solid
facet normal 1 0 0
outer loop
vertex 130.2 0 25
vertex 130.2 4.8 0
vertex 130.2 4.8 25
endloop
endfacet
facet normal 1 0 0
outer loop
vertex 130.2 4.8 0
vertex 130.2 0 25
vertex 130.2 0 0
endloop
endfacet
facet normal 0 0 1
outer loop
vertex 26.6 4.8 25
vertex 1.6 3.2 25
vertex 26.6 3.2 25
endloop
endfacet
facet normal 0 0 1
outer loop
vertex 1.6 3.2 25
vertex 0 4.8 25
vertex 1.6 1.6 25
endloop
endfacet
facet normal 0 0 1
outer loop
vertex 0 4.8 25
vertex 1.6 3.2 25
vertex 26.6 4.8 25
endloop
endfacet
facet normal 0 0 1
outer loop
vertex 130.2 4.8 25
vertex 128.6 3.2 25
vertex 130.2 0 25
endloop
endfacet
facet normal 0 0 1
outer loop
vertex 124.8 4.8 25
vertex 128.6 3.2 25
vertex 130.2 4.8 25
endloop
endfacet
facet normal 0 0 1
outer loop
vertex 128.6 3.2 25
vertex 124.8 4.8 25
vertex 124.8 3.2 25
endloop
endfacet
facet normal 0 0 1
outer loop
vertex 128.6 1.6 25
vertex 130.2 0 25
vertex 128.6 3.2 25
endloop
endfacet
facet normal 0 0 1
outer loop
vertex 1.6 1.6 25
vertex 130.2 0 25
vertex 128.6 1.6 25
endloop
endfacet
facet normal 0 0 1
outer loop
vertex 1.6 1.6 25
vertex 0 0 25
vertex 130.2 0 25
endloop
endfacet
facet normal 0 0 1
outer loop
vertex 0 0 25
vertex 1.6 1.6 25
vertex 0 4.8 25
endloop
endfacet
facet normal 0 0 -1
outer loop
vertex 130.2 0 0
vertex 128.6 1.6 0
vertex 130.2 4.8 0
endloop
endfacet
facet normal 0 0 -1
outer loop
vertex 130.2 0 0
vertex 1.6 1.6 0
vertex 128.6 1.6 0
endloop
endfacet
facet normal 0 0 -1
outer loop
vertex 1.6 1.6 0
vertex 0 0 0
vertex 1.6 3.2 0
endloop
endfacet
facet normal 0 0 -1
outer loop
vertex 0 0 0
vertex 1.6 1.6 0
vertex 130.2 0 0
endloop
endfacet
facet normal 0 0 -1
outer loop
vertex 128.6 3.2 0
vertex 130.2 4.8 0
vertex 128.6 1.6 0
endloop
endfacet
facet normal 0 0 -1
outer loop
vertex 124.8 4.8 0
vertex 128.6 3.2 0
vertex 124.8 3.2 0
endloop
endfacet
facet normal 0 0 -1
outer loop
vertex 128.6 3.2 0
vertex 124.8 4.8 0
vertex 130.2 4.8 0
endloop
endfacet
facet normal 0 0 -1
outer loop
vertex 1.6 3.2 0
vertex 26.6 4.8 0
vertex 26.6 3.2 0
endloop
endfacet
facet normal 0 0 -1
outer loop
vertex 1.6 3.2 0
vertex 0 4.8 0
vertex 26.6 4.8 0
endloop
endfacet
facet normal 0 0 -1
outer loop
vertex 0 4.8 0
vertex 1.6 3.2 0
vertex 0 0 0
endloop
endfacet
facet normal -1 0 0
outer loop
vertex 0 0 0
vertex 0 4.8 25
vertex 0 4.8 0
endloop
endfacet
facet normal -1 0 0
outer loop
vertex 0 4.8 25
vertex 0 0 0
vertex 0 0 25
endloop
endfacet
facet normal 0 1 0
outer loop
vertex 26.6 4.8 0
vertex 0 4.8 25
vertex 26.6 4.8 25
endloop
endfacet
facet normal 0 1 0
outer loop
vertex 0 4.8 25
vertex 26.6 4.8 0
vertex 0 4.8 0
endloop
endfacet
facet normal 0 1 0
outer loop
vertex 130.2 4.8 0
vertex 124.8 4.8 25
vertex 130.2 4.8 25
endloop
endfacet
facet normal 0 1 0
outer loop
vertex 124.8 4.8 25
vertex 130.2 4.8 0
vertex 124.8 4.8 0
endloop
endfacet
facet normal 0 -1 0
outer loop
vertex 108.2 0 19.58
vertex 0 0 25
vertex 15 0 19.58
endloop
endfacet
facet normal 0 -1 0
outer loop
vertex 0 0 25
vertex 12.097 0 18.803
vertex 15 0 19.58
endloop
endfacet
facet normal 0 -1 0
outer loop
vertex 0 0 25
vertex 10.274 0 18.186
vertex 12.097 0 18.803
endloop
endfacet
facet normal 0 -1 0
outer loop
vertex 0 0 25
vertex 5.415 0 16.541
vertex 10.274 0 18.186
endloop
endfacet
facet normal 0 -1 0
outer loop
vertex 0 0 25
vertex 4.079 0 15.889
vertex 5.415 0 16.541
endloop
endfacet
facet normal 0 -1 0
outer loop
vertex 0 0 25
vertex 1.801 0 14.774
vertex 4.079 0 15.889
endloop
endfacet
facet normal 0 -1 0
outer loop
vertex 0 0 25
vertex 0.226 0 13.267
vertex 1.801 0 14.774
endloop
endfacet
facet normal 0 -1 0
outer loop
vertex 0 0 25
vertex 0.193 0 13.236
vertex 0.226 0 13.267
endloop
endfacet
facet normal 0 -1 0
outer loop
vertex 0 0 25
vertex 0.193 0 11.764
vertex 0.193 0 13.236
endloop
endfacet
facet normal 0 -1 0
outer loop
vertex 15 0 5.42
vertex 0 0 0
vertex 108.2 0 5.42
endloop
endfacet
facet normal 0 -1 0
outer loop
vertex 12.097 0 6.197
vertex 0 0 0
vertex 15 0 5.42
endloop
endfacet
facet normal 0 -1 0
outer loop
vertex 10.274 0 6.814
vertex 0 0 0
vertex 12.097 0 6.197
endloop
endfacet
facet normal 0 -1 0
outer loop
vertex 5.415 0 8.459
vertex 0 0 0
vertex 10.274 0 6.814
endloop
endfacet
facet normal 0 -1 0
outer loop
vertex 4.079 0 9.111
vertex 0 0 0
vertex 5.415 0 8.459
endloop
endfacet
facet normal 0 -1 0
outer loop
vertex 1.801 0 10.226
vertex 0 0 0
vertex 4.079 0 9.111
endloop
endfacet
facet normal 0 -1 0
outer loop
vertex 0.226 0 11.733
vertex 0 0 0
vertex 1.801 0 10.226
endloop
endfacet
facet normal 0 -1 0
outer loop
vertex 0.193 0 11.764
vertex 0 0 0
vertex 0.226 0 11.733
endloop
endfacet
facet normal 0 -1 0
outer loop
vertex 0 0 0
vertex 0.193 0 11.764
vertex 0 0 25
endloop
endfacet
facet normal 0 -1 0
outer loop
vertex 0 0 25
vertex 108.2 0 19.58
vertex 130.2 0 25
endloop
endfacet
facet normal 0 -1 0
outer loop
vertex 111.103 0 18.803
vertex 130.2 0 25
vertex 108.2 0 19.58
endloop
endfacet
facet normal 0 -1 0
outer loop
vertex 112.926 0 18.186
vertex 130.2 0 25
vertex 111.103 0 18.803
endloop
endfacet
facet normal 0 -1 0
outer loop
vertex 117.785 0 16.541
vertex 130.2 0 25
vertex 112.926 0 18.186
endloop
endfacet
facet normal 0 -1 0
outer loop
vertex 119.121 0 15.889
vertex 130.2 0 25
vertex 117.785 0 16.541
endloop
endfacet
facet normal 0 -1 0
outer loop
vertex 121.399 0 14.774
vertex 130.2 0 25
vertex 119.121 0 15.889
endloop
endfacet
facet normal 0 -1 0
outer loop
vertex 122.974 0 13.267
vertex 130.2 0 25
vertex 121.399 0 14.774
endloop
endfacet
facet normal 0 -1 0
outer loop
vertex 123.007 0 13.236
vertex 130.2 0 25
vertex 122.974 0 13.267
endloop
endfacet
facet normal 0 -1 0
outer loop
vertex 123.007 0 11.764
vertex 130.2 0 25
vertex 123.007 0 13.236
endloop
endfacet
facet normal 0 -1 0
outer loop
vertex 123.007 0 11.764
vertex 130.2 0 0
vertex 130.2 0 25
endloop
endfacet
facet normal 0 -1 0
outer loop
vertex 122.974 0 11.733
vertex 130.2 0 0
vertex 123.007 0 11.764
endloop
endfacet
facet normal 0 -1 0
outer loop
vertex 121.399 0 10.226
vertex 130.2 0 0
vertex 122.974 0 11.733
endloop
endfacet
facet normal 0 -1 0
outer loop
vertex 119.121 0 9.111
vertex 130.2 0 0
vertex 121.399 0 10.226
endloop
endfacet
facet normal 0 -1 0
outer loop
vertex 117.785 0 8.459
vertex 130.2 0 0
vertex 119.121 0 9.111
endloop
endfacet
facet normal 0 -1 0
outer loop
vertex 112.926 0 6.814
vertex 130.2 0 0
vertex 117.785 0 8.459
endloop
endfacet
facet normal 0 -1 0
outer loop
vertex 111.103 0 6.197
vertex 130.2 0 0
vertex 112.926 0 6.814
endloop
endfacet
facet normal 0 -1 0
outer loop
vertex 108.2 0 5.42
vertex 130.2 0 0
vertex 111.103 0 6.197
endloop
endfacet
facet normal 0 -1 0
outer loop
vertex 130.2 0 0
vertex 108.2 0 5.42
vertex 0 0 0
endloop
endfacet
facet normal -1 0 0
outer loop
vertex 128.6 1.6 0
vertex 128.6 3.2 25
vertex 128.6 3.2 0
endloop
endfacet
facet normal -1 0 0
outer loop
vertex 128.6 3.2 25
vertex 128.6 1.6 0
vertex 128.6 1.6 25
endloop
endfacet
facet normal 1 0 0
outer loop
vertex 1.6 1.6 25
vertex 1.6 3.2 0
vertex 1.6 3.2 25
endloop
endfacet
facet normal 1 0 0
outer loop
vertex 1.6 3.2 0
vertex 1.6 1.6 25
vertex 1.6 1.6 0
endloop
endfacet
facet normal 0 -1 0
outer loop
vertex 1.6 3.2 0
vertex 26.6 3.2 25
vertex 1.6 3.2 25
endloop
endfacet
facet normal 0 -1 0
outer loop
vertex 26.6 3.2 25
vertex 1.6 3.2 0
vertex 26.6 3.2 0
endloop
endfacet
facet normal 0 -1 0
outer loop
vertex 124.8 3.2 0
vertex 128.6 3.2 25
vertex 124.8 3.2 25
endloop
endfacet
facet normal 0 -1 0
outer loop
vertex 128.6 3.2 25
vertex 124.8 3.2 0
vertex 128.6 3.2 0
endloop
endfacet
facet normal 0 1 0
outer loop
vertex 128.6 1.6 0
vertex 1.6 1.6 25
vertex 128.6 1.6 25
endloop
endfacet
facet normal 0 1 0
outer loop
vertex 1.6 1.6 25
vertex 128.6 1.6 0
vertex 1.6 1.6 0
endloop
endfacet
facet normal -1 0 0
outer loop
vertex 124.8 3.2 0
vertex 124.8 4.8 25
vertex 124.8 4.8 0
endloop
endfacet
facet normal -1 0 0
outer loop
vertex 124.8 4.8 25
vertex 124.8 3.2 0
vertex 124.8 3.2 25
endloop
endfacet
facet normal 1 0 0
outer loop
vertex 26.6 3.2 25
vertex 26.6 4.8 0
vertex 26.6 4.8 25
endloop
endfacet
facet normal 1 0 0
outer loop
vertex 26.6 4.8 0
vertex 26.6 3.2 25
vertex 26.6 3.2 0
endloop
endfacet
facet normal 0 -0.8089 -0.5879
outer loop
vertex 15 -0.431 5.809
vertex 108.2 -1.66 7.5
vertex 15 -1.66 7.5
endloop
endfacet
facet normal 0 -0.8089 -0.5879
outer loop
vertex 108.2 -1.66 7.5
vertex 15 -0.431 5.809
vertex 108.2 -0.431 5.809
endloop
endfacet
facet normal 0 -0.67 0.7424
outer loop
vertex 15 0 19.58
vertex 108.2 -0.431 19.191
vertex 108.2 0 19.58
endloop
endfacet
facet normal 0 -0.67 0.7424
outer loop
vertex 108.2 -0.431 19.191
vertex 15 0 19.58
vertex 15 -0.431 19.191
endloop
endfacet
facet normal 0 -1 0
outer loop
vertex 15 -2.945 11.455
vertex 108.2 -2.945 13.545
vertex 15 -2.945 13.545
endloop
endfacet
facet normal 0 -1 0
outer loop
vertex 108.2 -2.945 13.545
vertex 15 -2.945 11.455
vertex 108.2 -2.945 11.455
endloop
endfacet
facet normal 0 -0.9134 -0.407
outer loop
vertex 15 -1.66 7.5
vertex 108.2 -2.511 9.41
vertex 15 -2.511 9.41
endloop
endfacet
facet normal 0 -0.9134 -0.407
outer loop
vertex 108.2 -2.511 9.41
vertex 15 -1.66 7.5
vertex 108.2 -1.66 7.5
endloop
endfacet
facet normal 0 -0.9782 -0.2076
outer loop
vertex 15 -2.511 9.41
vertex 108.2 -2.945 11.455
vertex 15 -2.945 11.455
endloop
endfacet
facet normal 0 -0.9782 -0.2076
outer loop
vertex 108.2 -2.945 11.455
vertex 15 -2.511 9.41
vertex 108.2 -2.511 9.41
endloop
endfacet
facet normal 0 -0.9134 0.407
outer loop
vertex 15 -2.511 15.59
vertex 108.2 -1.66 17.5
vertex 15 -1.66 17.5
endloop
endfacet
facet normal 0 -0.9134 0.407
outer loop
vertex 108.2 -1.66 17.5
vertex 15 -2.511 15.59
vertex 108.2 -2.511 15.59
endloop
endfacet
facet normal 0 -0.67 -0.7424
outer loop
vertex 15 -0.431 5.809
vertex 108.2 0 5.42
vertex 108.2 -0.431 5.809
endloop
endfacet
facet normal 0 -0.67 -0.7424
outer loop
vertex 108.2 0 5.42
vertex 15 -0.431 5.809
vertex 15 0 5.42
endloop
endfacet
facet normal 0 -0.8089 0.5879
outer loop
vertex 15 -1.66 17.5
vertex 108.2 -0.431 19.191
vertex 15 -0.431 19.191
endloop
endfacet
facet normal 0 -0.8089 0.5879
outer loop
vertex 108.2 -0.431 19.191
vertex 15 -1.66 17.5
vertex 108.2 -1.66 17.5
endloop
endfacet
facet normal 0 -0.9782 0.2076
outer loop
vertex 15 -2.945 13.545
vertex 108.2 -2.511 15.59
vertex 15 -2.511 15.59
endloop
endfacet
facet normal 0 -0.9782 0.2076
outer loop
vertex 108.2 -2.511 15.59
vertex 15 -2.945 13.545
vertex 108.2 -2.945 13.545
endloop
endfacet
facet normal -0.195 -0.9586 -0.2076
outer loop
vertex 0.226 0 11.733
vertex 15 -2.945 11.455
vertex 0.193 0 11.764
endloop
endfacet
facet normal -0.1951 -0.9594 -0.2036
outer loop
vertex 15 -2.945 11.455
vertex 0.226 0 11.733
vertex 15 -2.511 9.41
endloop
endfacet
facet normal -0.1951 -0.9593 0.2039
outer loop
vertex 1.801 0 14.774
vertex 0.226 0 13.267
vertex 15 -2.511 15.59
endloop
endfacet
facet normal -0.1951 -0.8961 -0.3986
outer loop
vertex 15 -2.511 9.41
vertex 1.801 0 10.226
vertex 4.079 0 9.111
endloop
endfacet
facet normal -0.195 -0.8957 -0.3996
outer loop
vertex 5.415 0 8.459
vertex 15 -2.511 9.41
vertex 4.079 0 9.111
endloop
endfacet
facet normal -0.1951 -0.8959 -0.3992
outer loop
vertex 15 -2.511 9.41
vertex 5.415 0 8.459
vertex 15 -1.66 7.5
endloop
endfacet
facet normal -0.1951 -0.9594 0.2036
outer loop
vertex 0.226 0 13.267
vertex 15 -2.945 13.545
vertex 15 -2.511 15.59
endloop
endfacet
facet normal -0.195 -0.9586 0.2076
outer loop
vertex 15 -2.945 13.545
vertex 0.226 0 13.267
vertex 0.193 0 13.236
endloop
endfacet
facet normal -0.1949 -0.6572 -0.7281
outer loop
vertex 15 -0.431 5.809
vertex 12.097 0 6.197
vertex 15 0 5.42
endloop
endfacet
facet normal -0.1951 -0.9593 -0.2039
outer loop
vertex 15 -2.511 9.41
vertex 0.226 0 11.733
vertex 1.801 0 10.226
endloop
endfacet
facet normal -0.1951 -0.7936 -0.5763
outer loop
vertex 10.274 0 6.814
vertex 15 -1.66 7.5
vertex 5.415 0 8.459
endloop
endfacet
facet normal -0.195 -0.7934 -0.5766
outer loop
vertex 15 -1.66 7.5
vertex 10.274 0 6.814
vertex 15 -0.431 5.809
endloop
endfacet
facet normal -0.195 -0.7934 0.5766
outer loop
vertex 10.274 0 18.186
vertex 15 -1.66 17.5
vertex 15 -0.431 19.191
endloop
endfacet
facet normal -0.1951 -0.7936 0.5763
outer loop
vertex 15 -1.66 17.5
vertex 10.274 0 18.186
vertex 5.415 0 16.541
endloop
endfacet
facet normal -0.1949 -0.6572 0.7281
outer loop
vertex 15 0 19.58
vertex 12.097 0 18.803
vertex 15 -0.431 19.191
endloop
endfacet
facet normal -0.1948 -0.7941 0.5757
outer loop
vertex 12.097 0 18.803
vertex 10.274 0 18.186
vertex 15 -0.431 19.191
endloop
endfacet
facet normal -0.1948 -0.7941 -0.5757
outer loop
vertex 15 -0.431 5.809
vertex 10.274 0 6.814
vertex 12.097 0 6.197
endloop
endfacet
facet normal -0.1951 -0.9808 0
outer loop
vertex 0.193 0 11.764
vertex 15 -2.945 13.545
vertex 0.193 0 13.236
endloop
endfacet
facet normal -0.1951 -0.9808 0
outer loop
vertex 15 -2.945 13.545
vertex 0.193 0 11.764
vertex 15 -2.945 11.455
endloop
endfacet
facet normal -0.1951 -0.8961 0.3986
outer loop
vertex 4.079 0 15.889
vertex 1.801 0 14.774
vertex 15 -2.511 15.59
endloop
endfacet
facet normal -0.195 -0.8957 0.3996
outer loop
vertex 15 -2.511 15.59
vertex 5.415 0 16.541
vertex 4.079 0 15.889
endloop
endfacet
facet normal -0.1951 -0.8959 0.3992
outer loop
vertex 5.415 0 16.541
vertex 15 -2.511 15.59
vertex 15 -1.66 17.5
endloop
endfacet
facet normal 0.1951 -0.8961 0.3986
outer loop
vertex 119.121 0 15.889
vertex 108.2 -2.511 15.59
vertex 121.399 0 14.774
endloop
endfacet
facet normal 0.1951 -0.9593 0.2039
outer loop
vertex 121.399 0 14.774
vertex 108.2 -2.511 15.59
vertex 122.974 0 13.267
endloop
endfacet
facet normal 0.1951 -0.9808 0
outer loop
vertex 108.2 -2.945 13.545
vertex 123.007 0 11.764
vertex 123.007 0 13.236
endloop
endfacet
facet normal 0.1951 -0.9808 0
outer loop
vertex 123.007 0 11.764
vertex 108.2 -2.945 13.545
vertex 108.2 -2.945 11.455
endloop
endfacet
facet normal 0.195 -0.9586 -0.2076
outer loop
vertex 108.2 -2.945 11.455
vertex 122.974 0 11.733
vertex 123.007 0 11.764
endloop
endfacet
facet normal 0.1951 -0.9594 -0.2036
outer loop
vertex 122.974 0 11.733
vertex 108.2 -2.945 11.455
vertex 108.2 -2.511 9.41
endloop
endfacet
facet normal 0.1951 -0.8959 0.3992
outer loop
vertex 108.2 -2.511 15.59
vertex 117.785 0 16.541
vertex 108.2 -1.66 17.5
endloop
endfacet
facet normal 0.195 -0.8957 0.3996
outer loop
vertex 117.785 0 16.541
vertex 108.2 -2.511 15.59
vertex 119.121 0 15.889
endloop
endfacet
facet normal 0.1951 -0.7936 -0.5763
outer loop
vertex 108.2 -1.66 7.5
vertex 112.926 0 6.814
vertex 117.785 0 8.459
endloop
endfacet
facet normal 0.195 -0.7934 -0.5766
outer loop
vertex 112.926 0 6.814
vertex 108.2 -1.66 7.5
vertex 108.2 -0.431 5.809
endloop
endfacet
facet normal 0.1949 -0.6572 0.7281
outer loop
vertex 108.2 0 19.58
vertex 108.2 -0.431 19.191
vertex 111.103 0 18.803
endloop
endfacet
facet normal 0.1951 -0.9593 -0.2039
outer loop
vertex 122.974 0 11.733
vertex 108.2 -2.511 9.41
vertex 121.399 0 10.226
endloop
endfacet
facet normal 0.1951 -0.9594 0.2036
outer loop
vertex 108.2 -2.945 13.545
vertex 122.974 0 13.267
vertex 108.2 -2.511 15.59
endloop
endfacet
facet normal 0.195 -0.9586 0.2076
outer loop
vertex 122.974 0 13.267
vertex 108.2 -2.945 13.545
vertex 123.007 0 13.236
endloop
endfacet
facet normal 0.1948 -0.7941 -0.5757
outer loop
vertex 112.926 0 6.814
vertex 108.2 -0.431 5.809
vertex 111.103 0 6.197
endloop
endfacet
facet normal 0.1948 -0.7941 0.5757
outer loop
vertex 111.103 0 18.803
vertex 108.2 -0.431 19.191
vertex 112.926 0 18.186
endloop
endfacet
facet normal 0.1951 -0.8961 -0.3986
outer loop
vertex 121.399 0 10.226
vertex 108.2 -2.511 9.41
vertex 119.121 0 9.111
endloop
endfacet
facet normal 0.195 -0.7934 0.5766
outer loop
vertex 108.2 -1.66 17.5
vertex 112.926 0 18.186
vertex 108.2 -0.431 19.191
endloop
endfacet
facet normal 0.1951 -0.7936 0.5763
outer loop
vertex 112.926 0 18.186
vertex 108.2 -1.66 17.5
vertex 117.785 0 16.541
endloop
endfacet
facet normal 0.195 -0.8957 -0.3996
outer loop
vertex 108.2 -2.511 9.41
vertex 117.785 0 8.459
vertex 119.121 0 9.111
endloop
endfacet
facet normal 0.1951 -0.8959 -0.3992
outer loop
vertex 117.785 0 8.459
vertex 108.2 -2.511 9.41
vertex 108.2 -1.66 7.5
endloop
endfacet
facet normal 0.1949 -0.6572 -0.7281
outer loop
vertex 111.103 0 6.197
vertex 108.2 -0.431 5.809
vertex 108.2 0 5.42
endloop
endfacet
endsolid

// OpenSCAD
// Molle clip


wall_width=1.6;
gap=1.6;

total_length=5*25.4+2*wall_width;

clip_width=25;

clip_hook1 = 25;
clip_hook2 = 7;

rib_chamfer = 15;

module rounded_rib(length, height, base_dia) {
    translate([0, 0.5*base_dia-height, 0]) rotate([0, 90, 0]) difference()
    {
    union () {
    translate([0, 0, rib_chamfer]) cylinder(h=length-2*rib_chamfer, d=base_dia);
    translate([0, 0, 0]) cylinder(h=rib_chamfer, d2=base_dia, d1=base_dia-2*height);
    translate([0, 0, length-rib_chamfer]) cylinder(h=rib_chamfer, d1=base_dia, d2=base_dia-2*height);
    }
    translate([-0.5*base_dia, -0.5*base_dia+height , 0]) cube([base_dia, base_dia, length]);
    }
}

module base_clip() {
    difference() {
    //base
    cube([total_length, 2*wall_width+gap, clip_width]);
    
    //gap
    translate([wall_width, wall_width, 0]) cube([total_length-2*wall_width, gap, clip_width]);
    
    //opening
    translate([wall_width+clip_hook1, wall_width+gap, 0]) cube([total_length-clip_hook1-clip_hook2, wall_width, clip_width]);    
    }
}

base_clip();
translate([0, 0, 0.5*clip_width]) rounded_rib(length=total_length-clip_hook2, height=3, base_dia=20);
